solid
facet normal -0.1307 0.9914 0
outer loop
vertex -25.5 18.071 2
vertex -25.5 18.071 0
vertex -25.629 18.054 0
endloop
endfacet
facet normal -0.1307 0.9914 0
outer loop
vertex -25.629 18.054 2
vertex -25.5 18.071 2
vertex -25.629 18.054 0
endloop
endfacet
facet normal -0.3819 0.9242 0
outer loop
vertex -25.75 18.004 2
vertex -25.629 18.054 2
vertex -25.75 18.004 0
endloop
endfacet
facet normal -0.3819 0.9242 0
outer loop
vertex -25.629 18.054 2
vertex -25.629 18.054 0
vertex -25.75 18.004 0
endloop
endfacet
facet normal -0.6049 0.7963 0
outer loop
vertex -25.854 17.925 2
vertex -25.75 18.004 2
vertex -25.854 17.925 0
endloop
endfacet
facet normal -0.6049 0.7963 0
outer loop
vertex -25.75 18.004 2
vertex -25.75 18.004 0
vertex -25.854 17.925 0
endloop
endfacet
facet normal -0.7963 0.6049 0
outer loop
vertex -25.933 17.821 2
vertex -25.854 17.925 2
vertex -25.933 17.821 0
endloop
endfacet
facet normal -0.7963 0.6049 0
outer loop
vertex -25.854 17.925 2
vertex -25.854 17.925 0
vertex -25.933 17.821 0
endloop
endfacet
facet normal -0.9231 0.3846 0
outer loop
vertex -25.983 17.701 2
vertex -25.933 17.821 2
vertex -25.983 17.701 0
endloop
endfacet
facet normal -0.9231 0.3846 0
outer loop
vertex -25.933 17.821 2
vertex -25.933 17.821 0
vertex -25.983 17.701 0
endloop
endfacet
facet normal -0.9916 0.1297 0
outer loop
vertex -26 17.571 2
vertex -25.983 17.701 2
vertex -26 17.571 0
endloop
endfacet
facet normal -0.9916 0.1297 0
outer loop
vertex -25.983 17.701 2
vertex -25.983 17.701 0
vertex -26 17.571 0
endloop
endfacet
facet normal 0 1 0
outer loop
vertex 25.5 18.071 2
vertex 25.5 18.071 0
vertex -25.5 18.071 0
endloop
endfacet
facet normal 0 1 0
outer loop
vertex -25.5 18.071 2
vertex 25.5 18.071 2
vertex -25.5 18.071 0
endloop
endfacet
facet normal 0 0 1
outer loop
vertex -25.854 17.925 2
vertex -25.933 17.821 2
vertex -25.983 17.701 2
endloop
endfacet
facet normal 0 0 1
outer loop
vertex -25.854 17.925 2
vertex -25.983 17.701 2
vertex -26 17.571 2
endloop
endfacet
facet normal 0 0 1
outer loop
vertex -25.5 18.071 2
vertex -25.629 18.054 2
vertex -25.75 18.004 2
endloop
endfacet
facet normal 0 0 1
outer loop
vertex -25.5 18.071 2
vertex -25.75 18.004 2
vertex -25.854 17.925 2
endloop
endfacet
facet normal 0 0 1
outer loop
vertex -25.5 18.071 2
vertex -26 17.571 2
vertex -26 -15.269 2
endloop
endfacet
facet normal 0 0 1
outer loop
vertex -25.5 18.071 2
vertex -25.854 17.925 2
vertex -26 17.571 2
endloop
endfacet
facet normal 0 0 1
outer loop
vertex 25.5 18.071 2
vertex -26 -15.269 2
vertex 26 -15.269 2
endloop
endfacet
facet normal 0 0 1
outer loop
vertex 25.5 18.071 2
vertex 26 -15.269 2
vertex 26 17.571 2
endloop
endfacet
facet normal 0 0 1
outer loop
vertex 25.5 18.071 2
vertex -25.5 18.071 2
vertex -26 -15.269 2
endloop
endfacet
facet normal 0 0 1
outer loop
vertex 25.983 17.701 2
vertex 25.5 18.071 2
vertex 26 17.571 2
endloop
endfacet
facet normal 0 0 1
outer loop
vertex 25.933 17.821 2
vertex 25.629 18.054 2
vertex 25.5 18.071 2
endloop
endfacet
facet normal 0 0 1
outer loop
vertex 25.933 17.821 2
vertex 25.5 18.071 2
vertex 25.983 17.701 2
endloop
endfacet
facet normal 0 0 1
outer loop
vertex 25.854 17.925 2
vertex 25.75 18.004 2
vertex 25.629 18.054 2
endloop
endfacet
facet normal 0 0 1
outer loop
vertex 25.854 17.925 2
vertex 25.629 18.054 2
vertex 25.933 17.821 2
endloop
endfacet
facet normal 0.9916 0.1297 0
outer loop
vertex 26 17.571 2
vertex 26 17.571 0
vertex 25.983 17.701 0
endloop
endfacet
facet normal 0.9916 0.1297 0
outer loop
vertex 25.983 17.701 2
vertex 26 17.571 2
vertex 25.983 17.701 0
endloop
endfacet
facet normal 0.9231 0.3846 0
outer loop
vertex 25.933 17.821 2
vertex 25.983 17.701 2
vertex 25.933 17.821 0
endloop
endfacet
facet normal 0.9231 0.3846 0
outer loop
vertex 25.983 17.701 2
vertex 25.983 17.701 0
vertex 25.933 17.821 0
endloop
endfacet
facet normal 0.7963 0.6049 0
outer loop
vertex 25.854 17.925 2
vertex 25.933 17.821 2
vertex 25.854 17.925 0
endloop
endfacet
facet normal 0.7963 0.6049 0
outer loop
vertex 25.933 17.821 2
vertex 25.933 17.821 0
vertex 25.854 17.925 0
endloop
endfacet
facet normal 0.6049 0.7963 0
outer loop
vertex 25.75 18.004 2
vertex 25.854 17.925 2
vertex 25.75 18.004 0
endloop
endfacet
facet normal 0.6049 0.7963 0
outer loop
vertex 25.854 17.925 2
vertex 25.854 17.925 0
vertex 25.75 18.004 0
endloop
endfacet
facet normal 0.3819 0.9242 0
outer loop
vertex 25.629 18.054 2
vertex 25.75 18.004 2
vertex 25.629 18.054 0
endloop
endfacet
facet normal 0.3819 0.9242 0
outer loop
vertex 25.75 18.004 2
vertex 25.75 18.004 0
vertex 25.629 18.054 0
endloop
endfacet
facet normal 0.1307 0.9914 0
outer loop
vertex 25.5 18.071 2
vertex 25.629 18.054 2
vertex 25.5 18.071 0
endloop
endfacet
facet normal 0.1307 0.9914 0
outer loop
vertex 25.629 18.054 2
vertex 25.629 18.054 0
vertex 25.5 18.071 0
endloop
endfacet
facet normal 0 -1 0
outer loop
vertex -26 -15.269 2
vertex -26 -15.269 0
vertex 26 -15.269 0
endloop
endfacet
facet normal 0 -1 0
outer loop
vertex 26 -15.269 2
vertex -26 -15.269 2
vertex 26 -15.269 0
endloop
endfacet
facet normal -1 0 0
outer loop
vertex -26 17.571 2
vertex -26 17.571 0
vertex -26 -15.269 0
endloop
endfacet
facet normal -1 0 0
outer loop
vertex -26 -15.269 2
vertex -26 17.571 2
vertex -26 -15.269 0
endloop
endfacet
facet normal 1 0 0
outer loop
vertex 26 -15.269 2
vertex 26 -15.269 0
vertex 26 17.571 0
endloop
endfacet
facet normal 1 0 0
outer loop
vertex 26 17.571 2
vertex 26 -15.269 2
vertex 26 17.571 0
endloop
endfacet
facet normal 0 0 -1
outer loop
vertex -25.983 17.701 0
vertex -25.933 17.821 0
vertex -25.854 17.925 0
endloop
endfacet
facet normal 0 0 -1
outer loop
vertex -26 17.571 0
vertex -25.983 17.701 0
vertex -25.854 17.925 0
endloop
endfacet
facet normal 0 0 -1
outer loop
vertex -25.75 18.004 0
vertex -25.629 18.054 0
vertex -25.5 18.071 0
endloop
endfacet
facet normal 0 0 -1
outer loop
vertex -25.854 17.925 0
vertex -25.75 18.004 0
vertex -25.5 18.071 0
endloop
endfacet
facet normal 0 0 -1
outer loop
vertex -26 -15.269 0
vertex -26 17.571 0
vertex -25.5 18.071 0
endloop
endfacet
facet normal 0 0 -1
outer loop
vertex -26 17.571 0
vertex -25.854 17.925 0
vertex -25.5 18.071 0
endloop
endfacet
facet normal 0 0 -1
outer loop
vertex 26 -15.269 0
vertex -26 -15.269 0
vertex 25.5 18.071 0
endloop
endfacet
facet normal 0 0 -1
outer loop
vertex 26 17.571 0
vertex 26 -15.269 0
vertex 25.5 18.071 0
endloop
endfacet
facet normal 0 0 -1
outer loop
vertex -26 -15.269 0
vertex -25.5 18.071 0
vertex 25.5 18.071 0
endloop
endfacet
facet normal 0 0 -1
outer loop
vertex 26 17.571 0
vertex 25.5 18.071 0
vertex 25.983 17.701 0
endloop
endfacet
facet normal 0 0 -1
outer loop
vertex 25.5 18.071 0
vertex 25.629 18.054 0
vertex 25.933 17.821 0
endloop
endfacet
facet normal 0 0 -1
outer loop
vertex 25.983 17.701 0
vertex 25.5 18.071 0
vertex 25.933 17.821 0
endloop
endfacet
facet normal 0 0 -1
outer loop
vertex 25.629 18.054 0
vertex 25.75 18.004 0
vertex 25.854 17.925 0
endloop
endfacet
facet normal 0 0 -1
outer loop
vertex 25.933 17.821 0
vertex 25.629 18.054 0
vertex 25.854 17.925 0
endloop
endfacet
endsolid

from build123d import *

# Parameters (mm, degrees)
BOSS_EXTRUDE1_DEPTH = 2


with BuildPart() as part:
    # Sketch1 → Boss-Extrude1 (new body)
    with BuildSketch(Plane.XY):
        with BuildLine():
            Line((26, 13.571107206), (26, 17.571107206))
            ThreePointArc((26, 17.571107206), (25.853553391, 17.924660596), (25.5, 18.071107206))
            Line((25.5, 18.071107206), (21.499997229, 18.071107206))
            Line((21.499997229, 18.071107206), (21, 18.071107206))
            Line((21, 18.071107206), (-21, 18.071107206))
            Line((-21, 18.071107206), (-21.5, 18.071107206))
            Line((-21.5, 18.071107206), (-25.5, 18.071107206))
            ThreePointArc((-25.5, 18.071107206), (-25.853553391, 17.924660596), (-26, 17.571107206))
            Line((-26, 17.571107206), (-26, 13.571104435))
            Line((-26, 13.571104435), (-26, 13.071107206))
            Line((-26, 13.071107206), (-26, -15.268618748))
            Line((-26, -15.268618748), (26, -15.268618748))
            Line((26, -15.268618748), (26, 13.071107206))
            Line((26, 13.071107206), (26, 13.571107206))
        make_face()
    extrude(amount=BOSS_EXTRUDE1_DEPTH)


solid = part.part
